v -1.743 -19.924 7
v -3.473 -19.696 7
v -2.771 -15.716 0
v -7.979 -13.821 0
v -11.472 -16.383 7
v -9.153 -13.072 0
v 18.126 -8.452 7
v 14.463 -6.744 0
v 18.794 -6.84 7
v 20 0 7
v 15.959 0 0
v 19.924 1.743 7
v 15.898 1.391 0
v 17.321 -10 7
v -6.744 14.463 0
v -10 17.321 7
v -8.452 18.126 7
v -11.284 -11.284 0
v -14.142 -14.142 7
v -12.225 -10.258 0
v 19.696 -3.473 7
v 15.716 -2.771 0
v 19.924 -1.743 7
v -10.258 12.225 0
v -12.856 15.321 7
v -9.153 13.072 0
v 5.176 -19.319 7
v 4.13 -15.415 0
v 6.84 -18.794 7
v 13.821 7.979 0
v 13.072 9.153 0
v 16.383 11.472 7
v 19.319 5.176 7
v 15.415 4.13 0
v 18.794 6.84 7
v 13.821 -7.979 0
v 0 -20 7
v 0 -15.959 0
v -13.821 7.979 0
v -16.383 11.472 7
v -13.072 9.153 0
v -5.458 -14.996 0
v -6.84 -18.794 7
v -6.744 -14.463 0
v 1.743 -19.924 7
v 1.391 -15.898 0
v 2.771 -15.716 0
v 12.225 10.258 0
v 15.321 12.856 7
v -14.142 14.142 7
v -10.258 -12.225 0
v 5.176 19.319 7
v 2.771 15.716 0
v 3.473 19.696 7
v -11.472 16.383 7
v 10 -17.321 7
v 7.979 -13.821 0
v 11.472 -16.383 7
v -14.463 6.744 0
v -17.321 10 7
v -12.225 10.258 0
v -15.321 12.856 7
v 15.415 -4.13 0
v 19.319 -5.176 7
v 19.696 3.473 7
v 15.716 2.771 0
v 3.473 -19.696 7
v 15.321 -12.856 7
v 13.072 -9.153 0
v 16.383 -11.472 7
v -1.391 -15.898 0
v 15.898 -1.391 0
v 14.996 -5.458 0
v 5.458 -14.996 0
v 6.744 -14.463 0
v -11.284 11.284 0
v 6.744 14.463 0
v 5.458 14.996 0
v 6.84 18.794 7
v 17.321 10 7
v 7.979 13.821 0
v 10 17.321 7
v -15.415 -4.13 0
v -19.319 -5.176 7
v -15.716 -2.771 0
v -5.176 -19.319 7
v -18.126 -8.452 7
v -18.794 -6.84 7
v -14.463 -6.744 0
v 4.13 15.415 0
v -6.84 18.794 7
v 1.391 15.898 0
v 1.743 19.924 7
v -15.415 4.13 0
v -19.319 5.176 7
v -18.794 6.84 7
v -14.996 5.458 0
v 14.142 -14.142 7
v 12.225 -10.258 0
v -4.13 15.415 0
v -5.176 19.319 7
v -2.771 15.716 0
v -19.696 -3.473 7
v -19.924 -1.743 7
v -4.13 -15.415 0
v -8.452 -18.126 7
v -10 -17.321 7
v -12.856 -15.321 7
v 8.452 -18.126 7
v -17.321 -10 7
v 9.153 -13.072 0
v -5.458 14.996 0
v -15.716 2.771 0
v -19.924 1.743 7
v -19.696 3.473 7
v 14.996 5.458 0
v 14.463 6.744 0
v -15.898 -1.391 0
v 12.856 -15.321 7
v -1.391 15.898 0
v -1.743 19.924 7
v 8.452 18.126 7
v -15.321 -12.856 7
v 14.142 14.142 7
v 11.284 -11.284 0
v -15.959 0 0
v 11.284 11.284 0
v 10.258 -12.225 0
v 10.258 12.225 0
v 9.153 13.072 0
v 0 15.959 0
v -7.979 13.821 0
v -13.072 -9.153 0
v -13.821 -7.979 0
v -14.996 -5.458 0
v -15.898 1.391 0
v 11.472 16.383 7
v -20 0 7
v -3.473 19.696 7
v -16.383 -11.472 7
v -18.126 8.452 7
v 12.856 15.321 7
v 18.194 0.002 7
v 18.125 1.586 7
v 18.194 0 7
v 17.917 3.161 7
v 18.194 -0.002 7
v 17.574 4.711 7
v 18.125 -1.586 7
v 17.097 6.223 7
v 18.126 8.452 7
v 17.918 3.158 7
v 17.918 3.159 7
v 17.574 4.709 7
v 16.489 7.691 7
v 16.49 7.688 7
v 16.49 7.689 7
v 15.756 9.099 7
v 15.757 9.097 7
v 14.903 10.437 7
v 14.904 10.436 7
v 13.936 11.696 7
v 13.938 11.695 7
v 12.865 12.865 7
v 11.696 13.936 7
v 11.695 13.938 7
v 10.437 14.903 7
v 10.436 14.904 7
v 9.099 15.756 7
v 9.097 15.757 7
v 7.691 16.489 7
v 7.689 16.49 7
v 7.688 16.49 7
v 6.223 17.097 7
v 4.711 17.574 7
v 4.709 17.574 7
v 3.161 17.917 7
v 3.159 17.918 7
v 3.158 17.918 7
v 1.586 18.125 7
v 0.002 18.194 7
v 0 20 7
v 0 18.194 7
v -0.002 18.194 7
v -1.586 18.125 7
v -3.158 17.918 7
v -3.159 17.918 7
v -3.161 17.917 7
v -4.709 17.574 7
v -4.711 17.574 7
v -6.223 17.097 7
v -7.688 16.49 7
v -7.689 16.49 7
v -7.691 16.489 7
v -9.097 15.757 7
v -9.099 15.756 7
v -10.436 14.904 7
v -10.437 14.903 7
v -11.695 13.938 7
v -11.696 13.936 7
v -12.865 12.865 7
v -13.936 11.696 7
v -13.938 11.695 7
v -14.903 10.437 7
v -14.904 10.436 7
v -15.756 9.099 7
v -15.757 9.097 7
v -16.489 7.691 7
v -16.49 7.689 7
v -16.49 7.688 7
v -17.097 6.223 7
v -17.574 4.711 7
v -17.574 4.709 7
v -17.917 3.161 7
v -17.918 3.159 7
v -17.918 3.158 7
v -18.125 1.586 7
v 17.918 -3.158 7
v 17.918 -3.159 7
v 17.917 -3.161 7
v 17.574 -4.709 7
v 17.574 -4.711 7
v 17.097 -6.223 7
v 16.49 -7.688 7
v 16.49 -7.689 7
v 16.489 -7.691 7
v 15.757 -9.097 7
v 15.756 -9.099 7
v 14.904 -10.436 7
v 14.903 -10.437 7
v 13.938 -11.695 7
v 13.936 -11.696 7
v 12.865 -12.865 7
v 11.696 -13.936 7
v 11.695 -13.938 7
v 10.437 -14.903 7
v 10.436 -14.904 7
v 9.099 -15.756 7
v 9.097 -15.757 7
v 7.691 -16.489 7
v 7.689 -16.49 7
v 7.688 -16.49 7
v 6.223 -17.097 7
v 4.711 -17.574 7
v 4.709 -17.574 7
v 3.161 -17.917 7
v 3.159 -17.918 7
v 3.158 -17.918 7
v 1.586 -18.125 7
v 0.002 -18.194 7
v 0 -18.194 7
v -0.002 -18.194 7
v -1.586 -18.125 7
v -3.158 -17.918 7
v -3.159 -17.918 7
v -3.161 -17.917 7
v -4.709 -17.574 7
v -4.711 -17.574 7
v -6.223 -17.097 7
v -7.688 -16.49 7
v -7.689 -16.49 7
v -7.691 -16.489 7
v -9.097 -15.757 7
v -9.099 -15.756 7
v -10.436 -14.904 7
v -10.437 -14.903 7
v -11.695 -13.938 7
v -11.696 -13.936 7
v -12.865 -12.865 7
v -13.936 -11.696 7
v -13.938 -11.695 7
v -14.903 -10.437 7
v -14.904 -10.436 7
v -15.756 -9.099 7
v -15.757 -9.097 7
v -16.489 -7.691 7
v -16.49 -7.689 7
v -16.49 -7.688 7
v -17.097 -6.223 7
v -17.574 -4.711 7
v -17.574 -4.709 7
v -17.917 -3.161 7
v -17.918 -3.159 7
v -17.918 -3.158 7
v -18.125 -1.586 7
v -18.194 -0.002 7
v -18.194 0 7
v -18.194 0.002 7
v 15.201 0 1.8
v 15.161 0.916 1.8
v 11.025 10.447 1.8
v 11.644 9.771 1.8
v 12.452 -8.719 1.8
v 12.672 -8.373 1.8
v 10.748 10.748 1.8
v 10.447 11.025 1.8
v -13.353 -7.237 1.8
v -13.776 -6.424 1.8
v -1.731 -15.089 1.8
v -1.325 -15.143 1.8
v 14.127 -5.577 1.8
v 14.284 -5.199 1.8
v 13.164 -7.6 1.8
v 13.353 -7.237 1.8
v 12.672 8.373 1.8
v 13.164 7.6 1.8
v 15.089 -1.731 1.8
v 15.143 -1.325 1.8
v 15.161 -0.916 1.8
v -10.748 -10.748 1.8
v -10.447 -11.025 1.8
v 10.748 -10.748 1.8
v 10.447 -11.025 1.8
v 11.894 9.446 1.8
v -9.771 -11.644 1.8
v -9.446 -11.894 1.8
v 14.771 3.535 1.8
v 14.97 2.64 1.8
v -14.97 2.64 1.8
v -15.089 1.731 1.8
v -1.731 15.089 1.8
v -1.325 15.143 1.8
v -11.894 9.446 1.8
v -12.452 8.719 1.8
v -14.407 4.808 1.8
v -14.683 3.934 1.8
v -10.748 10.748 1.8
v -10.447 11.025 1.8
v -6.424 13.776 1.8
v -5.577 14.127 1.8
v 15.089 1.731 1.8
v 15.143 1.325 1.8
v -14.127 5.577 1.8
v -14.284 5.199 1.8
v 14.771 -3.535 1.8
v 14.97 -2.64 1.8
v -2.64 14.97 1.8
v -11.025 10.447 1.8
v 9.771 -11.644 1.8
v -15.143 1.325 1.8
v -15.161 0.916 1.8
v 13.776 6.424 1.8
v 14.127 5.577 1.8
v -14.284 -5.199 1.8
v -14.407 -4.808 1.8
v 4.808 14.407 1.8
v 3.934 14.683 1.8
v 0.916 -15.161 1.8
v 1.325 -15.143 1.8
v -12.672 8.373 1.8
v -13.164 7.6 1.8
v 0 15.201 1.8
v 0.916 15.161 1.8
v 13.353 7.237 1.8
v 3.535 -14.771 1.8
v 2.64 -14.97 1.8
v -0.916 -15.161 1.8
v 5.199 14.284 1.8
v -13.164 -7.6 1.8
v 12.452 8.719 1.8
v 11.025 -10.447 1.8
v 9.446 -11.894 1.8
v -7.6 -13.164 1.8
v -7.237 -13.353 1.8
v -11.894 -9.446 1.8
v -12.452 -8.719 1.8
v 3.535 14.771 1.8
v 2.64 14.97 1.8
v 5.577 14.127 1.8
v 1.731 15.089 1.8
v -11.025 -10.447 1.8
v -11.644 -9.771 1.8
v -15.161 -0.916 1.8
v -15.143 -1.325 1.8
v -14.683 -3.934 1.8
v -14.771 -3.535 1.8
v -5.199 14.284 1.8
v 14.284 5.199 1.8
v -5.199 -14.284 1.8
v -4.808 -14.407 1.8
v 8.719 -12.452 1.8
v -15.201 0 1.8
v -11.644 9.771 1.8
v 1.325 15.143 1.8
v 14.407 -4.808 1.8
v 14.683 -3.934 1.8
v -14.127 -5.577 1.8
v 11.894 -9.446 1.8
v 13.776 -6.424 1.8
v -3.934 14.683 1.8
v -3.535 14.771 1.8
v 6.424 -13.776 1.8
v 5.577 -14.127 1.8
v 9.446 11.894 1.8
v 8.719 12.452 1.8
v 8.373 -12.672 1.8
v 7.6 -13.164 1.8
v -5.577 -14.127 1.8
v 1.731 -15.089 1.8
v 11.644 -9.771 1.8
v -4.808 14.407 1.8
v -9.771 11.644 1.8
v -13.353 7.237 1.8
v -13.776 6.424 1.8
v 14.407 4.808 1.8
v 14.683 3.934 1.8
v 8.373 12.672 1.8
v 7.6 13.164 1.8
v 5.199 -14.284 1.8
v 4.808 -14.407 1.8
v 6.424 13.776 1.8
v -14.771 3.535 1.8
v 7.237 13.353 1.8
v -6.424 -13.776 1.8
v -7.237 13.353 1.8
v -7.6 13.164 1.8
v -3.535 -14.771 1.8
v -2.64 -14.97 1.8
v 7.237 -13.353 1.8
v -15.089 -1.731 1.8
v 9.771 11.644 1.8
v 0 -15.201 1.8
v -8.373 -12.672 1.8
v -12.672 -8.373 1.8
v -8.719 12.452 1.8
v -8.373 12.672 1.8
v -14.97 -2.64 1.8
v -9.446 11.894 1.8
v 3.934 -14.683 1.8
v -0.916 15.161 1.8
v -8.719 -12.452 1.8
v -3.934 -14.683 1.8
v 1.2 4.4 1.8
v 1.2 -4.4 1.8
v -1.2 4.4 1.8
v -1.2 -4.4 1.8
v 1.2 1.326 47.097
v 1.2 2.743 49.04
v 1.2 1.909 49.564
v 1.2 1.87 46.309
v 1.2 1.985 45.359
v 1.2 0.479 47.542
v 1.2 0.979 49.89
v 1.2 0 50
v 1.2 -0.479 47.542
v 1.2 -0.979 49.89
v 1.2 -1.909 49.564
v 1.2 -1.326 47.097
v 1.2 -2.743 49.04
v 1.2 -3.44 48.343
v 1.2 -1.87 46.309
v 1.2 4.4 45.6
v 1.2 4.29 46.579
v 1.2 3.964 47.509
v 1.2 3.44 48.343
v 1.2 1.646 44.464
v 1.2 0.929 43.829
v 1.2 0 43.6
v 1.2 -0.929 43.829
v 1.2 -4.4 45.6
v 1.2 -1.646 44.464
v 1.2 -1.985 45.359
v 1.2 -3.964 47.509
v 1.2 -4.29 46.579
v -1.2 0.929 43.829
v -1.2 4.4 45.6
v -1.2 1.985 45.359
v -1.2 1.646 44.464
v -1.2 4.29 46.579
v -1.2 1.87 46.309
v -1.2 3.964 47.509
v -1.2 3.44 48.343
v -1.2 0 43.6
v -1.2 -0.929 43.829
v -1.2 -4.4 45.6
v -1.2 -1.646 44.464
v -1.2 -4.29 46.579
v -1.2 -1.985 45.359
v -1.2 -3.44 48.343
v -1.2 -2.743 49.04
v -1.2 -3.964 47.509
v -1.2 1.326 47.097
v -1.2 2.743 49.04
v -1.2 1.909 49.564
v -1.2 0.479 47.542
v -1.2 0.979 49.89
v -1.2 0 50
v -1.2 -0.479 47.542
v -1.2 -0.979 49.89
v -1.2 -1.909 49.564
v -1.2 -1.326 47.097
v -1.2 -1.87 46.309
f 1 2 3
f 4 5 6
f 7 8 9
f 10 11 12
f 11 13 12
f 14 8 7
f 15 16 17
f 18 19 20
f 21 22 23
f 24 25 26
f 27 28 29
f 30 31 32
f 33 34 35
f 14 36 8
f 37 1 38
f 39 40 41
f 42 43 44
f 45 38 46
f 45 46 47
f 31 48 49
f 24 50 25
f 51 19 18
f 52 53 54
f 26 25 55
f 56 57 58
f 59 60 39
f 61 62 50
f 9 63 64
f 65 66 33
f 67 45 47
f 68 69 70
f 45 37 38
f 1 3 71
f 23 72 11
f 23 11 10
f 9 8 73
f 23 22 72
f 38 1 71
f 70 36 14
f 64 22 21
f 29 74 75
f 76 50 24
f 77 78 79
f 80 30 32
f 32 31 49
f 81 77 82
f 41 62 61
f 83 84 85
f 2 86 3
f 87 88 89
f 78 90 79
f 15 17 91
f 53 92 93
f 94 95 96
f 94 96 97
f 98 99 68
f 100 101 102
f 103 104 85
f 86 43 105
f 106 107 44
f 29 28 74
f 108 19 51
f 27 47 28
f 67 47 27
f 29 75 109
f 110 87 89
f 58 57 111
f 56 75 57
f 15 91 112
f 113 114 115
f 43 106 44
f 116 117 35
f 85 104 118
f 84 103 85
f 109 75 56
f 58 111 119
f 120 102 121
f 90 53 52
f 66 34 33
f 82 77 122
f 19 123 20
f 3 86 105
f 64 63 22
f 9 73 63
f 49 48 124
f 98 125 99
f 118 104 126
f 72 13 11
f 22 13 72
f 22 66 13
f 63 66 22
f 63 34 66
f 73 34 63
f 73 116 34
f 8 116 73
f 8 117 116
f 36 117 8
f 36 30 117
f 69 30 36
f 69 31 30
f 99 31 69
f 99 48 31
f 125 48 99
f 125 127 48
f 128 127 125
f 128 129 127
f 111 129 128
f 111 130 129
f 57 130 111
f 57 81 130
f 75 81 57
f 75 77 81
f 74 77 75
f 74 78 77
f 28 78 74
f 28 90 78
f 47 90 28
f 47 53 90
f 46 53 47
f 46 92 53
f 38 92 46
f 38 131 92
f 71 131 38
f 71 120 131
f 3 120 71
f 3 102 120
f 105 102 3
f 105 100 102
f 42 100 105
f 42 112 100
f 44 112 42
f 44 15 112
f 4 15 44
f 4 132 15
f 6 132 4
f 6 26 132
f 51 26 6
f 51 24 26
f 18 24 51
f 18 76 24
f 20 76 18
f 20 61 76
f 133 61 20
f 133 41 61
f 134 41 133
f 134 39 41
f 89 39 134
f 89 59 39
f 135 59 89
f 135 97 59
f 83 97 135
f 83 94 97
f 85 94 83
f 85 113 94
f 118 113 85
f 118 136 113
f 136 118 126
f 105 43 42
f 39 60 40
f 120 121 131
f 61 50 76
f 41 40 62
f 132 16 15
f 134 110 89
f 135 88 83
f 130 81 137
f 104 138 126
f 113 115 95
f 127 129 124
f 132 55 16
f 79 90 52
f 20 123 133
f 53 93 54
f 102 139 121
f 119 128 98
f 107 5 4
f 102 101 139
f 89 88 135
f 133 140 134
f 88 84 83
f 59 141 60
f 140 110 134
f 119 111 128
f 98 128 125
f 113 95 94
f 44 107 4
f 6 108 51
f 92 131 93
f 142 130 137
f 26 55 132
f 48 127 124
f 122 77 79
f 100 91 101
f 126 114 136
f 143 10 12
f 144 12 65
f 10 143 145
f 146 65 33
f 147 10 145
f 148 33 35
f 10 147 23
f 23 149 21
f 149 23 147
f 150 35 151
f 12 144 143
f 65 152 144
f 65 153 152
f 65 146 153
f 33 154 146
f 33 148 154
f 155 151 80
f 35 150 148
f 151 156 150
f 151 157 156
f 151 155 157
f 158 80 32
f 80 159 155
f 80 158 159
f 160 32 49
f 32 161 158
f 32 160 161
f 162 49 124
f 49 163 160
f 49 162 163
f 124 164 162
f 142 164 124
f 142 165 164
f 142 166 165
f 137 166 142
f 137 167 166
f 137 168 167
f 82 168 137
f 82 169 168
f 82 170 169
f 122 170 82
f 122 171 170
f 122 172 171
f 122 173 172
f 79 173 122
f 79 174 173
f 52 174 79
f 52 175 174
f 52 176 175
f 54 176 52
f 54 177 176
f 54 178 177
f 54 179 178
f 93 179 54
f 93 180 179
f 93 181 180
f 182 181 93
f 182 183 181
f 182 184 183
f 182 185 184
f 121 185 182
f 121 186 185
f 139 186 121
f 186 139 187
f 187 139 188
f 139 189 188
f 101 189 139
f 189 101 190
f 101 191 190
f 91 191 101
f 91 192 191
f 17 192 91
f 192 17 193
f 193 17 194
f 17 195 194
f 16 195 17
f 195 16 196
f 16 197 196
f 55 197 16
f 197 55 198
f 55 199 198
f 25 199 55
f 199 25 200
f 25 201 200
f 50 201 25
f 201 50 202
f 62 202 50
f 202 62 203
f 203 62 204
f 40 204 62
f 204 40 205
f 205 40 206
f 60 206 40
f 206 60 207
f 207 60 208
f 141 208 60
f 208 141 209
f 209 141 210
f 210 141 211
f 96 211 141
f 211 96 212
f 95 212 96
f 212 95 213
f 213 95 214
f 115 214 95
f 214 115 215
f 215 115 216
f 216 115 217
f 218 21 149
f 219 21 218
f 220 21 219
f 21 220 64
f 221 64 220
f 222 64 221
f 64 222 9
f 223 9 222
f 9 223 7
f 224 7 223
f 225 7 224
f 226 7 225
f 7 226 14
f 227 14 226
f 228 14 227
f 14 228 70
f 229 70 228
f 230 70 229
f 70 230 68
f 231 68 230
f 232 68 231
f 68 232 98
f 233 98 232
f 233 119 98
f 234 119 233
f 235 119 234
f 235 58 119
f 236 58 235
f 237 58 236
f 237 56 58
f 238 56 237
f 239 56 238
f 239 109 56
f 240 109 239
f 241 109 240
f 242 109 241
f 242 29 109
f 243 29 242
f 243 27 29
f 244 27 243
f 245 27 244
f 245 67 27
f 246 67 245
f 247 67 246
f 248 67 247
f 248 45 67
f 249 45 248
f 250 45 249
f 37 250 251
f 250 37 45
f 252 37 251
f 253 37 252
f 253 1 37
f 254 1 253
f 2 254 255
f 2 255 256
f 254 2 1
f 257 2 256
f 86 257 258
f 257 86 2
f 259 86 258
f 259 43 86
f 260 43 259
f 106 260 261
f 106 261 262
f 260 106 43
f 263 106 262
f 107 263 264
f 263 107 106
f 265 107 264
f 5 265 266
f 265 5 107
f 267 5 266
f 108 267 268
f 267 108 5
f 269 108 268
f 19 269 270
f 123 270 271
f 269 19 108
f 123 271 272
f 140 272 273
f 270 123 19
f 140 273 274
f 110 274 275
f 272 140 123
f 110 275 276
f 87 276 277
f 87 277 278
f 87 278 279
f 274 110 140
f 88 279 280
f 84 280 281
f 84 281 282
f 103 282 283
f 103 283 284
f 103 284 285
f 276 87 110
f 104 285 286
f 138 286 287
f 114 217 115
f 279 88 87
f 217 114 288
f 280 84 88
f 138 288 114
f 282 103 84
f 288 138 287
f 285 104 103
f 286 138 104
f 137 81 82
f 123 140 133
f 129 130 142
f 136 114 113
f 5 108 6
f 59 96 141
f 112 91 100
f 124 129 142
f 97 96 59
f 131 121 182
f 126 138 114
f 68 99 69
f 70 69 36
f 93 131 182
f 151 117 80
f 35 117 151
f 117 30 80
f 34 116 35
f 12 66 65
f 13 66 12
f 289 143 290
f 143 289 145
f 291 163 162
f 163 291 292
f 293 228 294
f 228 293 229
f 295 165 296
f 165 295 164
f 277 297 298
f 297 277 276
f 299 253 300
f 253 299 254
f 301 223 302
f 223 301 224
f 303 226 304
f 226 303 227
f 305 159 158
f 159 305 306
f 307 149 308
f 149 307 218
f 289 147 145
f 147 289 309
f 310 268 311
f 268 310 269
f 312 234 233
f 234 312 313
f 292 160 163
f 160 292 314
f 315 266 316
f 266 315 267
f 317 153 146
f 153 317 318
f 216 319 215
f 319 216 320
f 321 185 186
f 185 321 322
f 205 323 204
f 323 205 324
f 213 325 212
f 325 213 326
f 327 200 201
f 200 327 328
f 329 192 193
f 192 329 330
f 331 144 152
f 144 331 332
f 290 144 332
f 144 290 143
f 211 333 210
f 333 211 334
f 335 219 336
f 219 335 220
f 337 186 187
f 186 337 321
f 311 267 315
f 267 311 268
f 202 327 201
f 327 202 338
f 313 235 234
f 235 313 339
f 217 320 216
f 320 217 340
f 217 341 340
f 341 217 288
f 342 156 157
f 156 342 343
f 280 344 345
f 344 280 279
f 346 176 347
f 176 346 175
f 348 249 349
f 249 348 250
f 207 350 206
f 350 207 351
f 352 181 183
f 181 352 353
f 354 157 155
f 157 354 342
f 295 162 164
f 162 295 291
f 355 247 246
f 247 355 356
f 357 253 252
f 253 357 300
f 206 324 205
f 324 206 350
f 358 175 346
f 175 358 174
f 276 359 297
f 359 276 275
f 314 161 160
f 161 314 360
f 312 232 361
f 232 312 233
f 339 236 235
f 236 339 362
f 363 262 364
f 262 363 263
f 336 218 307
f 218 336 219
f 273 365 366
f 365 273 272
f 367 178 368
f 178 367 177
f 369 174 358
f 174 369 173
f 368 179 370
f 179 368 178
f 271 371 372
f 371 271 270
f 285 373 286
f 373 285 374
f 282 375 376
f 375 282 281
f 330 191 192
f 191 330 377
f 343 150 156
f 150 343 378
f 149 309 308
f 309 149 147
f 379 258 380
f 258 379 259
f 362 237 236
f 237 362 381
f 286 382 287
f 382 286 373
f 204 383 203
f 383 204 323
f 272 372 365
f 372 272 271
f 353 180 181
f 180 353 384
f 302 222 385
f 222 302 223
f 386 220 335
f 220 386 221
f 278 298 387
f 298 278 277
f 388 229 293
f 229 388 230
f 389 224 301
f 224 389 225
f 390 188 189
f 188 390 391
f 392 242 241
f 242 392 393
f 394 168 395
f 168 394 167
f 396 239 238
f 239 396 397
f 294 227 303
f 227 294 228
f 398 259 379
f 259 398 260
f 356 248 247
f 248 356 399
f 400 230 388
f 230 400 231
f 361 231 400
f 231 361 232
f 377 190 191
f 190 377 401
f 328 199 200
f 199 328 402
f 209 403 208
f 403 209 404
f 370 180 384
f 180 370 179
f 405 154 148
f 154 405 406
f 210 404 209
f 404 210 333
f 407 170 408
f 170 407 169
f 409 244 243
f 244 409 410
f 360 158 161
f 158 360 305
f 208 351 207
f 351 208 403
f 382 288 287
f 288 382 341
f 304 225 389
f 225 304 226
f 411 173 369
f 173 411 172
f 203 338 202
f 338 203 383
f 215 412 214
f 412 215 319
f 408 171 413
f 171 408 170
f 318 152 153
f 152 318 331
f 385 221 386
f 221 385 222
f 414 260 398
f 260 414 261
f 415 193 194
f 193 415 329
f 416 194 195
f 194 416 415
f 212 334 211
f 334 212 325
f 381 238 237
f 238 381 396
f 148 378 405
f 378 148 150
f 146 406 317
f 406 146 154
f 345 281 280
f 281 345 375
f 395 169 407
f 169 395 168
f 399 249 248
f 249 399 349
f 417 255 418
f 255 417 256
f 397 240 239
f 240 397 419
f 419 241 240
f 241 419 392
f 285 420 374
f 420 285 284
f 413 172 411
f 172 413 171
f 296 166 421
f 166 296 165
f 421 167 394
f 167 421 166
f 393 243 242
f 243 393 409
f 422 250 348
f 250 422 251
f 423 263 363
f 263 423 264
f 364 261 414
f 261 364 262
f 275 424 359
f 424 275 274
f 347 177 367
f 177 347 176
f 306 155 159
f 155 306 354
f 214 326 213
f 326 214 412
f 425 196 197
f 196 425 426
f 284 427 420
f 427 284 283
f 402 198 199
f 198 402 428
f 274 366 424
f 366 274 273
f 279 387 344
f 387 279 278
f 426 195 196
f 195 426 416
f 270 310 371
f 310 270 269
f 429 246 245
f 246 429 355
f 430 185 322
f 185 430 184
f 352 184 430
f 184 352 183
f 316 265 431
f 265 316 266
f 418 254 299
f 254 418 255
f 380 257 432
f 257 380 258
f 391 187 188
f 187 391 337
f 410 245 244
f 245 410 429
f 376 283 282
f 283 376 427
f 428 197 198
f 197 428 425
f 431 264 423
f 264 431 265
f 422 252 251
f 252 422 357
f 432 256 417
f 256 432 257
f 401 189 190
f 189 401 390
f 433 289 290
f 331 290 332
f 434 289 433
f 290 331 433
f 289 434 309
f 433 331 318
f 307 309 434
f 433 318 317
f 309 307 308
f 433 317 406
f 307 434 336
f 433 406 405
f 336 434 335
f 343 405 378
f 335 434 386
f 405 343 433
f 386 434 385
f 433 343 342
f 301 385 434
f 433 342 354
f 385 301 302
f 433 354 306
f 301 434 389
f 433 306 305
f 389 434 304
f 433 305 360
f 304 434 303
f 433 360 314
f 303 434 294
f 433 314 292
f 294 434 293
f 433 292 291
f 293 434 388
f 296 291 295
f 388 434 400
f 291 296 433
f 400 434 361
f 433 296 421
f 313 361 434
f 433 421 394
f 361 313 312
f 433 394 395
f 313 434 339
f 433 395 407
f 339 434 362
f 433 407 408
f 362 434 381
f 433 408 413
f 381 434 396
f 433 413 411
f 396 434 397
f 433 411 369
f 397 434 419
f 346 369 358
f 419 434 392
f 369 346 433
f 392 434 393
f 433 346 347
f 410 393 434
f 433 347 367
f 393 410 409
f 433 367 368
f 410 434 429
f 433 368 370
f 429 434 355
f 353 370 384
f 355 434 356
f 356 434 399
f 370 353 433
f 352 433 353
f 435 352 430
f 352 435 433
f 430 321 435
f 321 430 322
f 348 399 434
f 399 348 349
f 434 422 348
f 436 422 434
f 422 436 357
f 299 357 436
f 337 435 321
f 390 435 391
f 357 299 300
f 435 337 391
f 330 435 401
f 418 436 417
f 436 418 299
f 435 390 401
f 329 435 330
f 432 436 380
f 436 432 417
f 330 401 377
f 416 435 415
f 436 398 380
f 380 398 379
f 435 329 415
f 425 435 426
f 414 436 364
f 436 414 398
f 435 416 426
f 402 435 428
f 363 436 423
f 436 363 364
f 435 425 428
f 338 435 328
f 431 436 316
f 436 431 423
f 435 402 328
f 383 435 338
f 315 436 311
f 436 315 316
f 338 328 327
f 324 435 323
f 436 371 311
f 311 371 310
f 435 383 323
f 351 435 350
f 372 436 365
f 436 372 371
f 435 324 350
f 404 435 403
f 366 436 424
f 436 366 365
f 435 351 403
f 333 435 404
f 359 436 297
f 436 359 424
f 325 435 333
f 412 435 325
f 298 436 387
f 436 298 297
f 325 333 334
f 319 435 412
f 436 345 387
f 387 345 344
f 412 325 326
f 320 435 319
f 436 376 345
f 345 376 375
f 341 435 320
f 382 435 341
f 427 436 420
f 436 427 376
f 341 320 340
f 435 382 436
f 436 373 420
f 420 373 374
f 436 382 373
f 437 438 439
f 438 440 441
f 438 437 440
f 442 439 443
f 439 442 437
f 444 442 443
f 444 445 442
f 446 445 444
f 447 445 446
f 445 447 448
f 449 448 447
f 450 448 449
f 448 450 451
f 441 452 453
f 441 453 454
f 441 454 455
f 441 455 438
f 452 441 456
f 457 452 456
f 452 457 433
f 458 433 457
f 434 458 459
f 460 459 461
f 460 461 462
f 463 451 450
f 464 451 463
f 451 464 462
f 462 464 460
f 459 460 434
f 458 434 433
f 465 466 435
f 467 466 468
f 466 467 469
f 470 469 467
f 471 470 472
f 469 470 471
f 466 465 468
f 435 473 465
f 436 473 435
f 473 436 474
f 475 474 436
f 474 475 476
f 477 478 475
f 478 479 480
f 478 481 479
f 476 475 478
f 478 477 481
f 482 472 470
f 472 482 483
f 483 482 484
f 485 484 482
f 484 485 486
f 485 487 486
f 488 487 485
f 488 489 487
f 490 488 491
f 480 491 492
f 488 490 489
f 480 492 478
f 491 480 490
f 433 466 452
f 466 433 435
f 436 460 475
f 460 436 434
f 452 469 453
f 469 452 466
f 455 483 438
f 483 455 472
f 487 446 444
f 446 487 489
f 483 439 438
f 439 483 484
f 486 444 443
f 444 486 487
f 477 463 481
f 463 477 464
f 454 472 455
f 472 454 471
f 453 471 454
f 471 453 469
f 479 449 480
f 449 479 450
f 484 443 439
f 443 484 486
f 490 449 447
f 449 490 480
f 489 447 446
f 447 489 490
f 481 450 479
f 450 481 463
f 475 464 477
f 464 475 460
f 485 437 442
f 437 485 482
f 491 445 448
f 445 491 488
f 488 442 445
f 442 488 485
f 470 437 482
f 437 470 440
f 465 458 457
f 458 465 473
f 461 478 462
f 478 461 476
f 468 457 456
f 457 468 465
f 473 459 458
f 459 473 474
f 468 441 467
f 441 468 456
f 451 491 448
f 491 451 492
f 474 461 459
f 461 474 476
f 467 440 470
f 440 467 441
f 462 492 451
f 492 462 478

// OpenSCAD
// -*- mode: SCAD ; c-file-style: "ellemtel" ; coding: utf-8 -*-
//
// simple, functional small mushroom anchor
//
// Copyright 2018 Roland Sieker <ospalh@gmail.com>
// Licence: CC-BY-SA 4.0

// Radius of the cap in millimetres
r = 20;  // [5:1:50]

// size of the "chain" hole
hl = 4;  // [1:0.5:10]

// Set this to "render" and click on "Create Thing" when done with the setup.
preview = 1; // [0:render, 1:preview]



/* [Hidden] */

// Done with the customizer

// *******************************************************
// Extra parameters. These can be changed reasonably safely.

l_to_r = 2.5;  // Length of the stem in rs
r_to_h = 0.35;

w = 2.4;  // Wall width
p = 1.8; // cap width
c = 0.4;  // Clearance
angle = 60; // Overhangs much below 60 degrees are a problem for me

// *******************************************************
// Some shortcuts. These shouldn't be changed

tau = 2 * PI;  // pi is still wrong

xy_factor = 1/tan(angle);
// To get from a height to a horizontal width inclined correctly
z_factor = tan(angle);  // The other way around


h = r * r_to_h;
r_i = r - h * xy_factor;
l = r * l_to_r;


some_distance = 50;
ms = 0.01;  // Muggeseggele.

// fn for differently sized objects and fs, fa; all for preview or rendering.
pna = 40;
pnb = 15;
pa = 5;
ps = 1;
rna = 180;
rnb = 30;
ra = 1;
rs = 0.1;
function na() = (preview) ? pna : rna;
function nb() = (preview) ? pnb : rnb;
$fs = (preview) ? ps : rs;
$fa = (preview) ? pa : ra;

// *******************************************************
// End setup



// *******************************************************
// Generate the part

mushroom_anchor();



// *******************************************************
// Code for the parts themselves

module mushroom_anchor()
{
   anchor_cap();
   anchor_stem();
}

module anchor_cap()
{
   difference()
   {
      cylinder(r1=r_i, r2=r, h=h);
      translate([0, 0, -ms])
      {
         cylinder(r1=r_i-p, r2=r-p, h=h+2*ms);
      }
   }
   cylinder(r=r_i, h=p);
}

module anchor_stem()
{
   le = l - w  - hl/2;
   difference()
   {
      union()
      {
         translate([0,0,le/2])
         {
            cube([w,2*w+hl,le], center=true);
         }

         translate([0, 0, le])
         {
            rotate([0, 90, 0])
            {
               cylinder(r=w+hl/2, h=w, center=true);
            }
         }
      }
      translate([0, 0, le])
      {
         rotate([0, 90, 0])
         {
            cylinder(r=hl/2, h=w+2*ms, center=true);
         }
      }
   }
}
